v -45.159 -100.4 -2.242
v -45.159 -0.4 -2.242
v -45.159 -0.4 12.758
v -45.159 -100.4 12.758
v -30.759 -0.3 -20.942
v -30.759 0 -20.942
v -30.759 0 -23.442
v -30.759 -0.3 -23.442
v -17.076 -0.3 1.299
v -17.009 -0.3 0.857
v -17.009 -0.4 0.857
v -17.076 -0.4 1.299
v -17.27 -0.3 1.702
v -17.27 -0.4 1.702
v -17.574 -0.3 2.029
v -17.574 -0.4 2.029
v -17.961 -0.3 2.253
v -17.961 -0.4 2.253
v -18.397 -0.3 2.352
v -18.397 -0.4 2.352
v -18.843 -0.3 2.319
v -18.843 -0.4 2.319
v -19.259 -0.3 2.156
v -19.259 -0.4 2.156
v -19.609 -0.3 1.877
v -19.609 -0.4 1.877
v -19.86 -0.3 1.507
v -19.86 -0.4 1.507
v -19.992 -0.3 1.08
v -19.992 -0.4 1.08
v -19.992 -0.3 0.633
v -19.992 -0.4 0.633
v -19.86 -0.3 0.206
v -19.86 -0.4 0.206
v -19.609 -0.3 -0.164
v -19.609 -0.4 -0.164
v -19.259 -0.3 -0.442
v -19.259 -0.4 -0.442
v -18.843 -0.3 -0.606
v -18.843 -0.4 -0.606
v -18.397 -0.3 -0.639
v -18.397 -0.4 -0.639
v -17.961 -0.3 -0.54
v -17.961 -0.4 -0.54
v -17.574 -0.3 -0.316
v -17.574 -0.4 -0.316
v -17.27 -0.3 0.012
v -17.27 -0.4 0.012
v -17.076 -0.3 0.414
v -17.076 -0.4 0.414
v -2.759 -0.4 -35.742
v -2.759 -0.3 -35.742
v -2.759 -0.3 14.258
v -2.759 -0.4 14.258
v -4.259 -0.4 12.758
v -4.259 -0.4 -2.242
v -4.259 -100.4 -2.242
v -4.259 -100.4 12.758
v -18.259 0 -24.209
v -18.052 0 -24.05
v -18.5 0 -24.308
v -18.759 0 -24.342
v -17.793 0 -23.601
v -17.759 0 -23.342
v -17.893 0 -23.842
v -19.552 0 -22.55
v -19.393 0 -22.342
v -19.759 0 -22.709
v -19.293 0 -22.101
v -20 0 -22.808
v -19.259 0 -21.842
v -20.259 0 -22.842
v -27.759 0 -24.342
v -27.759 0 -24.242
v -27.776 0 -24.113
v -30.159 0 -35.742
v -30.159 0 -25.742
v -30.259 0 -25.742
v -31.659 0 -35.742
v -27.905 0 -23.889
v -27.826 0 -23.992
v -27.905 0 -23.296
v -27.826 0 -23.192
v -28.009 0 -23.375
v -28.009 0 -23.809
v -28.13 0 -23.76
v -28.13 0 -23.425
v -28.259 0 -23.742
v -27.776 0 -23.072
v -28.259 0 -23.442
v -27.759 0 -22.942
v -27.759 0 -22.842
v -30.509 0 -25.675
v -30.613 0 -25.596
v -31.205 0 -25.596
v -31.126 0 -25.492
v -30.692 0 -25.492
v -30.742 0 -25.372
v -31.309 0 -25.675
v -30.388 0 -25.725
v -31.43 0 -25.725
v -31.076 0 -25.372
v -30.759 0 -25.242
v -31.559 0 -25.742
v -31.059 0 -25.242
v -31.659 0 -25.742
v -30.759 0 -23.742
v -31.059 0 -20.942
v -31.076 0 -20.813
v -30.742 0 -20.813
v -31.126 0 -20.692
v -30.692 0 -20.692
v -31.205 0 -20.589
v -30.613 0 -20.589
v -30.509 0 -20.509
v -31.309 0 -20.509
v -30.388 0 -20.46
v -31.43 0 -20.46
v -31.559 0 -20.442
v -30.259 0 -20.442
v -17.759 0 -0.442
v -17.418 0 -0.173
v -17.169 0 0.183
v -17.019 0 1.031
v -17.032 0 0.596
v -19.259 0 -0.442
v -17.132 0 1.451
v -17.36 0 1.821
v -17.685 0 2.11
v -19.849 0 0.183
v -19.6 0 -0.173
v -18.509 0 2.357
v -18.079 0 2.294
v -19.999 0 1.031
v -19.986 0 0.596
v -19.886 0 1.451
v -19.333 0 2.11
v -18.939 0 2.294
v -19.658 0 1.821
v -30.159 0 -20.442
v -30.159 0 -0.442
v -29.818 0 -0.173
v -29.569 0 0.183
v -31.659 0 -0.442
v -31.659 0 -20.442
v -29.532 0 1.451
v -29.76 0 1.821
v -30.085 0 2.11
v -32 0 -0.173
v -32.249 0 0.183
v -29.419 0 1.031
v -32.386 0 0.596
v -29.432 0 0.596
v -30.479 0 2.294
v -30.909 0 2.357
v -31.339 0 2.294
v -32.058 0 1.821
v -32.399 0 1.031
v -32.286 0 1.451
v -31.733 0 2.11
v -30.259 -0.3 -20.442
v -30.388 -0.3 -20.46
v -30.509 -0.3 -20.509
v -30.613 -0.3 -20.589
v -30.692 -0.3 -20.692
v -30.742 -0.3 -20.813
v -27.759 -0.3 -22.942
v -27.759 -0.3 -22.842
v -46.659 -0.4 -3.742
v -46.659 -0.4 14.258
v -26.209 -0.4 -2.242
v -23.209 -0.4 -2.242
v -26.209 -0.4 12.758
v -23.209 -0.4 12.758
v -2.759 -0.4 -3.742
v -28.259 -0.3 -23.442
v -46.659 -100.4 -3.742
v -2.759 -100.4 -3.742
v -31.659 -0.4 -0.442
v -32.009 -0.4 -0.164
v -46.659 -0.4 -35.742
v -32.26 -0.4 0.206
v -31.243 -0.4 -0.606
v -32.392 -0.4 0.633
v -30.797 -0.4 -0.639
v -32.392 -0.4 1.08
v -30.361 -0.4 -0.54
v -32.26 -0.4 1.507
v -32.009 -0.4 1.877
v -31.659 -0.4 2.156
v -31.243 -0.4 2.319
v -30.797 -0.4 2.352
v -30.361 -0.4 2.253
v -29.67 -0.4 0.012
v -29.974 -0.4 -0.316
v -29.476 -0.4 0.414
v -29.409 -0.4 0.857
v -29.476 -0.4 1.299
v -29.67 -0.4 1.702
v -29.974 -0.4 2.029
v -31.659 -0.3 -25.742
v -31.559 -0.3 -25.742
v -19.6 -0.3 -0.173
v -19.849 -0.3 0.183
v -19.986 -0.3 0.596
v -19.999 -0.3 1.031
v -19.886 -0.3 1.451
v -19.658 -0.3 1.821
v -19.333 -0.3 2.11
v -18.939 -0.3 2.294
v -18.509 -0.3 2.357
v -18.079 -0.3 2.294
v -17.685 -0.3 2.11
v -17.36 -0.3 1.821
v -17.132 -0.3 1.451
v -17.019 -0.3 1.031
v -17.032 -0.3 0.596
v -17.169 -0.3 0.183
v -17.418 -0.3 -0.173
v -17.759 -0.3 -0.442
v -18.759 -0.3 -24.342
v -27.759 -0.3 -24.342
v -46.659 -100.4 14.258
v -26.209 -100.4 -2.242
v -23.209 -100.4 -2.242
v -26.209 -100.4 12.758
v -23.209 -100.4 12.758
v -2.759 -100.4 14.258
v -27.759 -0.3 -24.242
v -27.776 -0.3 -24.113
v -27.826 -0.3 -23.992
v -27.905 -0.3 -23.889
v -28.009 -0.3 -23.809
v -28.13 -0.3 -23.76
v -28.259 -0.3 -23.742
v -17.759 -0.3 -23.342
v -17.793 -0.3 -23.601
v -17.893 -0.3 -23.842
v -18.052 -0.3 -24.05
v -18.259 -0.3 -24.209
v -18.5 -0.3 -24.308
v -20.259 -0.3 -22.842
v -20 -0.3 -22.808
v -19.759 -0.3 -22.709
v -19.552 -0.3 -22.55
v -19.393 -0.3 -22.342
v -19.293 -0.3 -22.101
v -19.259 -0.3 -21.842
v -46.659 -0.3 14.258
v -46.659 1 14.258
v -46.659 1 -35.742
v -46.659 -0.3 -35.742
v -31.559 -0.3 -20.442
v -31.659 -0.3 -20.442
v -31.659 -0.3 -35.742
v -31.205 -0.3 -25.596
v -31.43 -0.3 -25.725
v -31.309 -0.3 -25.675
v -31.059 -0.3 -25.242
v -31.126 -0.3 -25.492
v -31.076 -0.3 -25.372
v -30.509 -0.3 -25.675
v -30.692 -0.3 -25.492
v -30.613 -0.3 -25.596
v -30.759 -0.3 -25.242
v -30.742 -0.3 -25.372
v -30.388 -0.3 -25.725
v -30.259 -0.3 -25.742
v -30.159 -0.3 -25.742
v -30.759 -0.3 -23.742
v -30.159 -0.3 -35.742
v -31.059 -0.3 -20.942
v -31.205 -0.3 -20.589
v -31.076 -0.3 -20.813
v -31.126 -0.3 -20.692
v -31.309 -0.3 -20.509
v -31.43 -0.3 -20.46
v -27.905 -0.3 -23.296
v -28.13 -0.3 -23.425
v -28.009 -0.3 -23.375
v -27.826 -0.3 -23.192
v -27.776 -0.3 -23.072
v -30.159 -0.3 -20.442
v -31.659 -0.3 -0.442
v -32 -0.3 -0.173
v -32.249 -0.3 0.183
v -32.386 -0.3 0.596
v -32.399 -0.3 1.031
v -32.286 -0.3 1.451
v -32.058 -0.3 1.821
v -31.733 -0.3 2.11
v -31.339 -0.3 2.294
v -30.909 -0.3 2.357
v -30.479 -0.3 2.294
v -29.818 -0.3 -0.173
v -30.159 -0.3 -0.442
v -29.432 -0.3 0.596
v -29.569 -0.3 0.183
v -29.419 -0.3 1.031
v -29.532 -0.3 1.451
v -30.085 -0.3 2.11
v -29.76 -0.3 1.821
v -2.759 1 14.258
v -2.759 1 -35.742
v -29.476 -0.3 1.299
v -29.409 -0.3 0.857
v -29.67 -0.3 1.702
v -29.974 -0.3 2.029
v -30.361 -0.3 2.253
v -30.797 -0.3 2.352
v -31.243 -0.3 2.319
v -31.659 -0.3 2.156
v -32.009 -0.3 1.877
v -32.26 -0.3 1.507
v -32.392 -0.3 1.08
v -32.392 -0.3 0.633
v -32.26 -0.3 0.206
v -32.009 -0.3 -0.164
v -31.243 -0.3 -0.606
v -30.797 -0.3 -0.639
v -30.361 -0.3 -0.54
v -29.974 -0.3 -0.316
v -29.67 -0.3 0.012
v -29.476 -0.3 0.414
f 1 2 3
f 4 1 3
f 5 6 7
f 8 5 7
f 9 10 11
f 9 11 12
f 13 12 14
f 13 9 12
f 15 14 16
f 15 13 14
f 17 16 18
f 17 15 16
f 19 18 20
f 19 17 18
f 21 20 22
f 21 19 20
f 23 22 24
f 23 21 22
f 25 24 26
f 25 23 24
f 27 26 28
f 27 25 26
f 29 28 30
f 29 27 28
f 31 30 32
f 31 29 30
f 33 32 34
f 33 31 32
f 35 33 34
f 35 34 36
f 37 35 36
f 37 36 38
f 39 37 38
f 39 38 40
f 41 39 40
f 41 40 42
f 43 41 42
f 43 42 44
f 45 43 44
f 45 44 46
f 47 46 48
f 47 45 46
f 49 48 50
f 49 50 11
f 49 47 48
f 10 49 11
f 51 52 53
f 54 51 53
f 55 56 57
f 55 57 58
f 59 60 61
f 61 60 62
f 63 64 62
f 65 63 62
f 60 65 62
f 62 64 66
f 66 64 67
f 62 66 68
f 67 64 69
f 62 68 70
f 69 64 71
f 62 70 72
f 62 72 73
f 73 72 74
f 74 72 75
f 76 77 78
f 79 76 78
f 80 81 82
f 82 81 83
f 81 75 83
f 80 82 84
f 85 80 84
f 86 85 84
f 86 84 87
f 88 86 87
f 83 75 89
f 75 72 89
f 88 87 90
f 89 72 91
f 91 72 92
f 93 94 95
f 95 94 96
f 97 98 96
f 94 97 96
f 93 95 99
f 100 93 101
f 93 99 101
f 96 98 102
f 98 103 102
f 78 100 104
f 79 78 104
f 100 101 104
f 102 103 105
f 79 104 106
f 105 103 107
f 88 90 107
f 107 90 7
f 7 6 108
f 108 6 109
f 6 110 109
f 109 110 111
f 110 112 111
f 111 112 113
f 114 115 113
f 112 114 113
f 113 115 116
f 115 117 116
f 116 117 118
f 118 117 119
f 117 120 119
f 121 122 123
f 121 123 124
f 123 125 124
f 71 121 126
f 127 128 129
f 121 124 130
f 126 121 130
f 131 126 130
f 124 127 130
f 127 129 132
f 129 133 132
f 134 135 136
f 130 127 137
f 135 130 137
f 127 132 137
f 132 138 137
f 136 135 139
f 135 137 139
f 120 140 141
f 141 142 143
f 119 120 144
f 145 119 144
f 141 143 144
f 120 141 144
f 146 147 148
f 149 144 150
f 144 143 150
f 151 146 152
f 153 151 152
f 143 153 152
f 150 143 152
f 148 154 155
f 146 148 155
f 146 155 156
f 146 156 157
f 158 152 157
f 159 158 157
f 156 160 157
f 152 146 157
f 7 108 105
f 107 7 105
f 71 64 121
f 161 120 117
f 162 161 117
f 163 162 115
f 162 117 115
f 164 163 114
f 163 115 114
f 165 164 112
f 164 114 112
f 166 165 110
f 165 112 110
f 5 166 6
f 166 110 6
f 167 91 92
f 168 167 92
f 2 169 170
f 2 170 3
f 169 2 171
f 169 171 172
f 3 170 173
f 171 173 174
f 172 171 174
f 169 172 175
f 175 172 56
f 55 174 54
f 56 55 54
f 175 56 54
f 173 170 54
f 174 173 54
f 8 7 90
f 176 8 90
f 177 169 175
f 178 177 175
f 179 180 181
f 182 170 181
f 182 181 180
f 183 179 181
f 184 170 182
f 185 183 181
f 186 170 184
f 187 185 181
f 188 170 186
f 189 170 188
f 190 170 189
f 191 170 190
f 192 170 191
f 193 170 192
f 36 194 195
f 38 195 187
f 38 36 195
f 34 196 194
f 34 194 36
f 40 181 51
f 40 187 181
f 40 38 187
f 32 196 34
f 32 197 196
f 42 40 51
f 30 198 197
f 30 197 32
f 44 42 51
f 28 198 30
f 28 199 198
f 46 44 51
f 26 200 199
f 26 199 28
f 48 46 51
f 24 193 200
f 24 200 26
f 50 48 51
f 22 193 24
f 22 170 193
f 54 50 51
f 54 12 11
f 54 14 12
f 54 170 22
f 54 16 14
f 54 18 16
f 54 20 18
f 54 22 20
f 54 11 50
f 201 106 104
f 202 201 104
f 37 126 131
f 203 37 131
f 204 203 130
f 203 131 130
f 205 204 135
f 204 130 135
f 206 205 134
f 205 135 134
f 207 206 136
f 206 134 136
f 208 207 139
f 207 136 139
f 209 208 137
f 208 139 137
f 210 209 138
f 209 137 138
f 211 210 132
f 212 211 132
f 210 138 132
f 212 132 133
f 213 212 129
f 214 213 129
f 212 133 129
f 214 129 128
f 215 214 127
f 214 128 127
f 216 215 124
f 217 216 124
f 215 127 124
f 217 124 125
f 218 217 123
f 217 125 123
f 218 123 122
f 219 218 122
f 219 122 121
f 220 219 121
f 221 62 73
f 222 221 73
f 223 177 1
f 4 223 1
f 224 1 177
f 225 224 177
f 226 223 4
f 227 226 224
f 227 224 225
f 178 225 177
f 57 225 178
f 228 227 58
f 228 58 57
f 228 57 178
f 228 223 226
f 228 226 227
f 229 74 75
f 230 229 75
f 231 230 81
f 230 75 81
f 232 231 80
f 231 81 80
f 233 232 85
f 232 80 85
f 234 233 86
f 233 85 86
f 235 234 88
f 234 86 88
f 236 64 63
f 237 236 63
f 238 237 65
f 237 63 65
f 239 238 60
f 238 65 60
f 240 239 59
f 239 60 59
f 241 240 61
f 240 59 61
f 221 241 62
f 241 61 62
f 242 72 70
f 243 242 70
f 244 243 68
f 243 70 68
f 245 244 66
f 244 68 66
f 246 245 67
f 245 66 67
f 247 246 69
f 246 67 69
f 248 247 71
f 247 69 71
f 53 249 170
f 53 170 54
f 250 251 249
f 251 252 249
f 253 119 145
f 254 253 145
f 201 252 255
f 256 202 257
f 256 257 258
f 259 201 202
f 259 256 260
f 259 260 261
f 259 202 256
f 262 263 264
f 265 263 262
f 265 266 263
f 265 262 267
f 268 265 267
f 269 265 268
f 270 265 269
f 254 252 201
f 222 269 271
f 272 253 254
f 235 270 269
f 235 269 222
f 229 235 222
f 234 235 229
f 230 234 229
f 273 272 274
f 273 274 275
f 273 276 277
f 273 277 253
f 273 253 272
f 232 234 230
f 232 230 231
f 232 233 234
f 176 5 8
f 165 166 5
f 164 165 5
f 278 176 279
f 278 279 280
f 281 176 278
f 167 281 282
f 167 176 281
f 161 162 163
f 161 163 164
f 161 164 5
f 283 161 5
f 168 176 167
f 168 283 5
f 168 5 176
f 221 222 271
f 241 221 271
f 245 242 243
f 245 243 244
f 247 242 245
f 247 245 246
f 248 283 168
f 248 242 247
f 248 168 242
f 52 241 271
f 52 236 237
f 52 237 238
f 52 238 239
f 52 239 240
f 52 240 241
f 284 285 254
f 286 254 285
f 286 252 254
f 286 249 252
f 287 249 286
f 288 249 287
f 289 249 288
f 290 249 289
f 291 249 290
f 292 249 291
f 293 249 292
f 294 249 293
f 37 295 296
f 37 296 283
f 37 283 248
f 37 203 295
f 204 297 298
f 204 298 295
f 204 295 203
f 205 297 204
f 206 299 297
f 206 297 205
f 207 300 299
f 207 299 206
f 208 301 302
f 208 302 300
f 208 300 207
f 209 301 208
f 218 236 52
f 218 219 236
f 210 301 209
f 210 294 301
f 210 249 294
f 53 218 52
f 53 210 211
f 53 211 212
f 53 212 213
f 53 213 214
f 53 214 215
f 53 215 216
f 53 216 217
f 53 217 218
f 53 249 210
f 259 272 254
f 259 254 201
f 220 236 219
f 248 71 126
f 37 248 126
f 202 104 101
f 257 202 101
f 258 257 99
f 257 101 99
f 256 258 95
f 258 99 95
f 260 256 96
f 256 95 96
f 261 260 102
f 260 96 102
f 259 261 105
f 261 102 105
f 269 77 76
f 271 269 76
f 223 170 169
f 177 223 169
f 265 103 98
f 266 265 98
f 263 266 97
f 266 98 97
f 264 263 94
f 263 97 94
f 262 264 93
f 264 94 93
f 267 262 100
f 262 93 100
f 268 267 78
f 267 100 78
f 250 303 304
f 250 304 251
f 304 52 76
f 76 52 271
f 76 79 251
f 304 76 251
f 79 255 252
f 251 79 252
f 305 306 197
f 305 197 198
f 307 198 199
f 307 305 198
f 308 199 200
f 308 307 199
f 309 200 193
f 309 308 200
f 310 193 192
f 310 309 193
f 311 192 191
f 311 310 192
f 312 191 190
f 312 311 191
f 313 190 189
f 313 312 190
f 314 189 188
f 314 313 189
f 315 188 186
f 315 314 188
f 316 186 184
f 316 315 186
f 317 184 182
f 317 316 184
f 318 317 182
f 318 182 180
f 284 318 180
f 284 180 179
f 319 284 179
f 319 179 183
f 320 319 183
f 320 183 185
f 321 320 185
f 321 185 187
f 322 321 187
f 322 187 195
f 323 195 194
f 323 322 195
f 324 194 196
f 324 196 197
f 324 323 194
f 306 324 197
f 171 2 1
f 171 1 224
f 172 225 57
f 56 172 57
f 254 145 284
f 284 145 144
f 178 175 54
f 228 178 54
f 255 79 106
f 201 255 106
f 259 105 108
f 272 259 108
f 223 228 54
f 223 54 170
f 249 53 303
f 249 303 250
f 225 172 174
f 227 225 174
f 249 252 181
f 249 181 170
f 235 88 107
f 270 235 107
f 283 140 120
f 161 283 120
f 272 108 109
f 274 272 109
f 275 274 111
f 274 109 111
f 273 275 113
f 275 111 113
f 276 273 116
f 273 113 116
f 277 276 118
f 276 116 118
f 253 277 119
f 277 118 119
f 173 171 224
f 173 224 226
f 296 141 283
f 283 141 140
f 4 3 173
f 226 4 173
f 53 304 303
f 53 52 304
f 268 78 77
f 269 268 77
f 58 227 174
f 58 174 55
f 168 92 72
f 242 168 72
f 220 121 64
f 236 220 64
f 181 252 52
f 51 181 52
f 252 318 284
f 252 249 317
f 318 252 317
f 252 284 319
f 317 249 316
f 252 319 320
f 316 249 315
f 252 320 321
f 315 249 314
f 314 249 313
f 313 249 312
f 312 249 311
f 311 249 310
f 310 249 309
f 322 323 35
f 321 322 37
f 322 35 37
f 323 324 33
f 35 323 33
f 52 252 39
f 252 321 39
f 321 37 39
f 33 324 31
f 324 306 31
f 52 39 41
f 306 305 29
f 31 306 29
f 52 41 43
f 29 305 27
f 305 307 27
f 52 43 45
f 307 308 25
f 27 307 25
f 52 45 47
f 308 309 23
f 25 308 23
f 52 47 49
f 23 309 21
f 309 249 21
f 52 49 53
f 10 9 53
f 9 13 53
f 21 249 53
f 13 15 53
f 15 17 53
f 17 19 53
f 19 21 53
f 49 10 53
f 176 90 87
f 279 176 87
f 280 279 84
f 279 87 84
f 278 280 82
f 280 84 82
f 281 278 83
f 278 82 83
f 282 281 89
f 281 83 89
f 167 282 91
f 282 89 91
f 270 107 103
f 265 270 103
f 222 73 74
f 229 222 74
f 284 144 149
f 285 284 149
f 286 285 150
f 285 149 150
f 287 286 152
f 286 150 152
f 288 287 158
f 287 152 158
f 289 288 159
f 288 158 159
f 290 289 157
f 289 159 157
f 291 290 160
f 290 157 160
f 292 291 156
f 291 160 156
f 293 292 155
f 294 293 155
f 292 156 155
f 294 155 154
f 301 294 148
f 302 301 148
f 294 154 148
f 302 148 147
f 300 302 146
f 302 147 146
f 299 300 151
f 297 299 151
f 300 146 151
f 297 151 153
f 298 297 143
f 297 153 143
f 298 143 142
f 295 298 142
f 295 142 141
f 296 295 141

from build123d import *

# Parameters (mm, degrees)
F1_DEPTH = 0.3
F2_W     = 43.9
F2_H     = 50
F3_DEPTH = 1
F4_W     = 43.9
F4_H     = 50
F4_R     = 1.5
F5_DEPTH = 0.1
F6_W     = 18.95
F6_H     = 15
F7_DEPTH = 100


with BuildPart() as f1:
    # F0 (on Front) → F1 (new body)
    with BuildSketch(Plane.XZ):
        with BuildLine():
            Line((-31.05896, -25.242487), (-31.05896, -20.942487))
            ThreePointArc((-31.05896, -20.942487), (-31.205407, -20.588934), (-31.55896, -20.442487))
            Line((-31.55896, -20.442487), (-31.65896, -20.442487))
            Line((-31.65896, -20.442487), (-31.65896, -0.442487))
            ThreePointArc((-31.65896, -0.442487), (-30.90896, 2.356551), (-30.15896, -0.442487))
            Line((-30.15896, -0.442487), (-30.15896, -20.442487))
            Line((-30.15896, -20.442487), (-30.25896, -20.442487))
            ThreePointArc((-30.25896, -20.442487), (-30.612513, -20.588934), (-30.75896, -20.942487))
            Line((-30.75896, -20.942487), (-30.75896, -23.442487))
            Line((-30.75896, -23.442487), (-28.25896, -23.442487))
            ThreePointArc((-28.25896, -23.442487), (-27.905407, -23.296041), (-27.75896, -22.942487))
            Line((-27.75896, -22.942487), (-27.75896, -22.842487))
            Line((-27.75896, -22.842487), (-20.25896, -22.842487))
            ThreePointArc((-20.25896, -22.842487), (-19.551853, -22.549594), (-19.25896, -21.842487))
            Line((-19.25896, -21.842487), (-19.25896, -0.442487))
            ThreePointArc((-19.25896, -0.442487), (-18.50896, 2.356551), (-17.75896, -0.442487))
            Line((-17.75896, -0.442487), (-17.75896, -23.342487))
            ThreePointArc((-17.75896, -23.342487), (-18.051853, -24.049594), (-18.75896, -24.342487))
            Line((-18.75896, -24.342487), (-27.75896, -24.342487))
            Line((-27.75896, -24.342487), (-27.75896, -24.242487))
            ThreePointArc((-27.75896, -24.242487), (-27.905407, -23.888934), (-28.25896, -23.742487))
            Line((-28.25896, -23.742487), (-30.75896, -23.742487))
            Line((-30.75896, -23.742487), (-30.75896, -25.242487))
            ThreePointArc((-30.75896, -25.242487), (-30.612513, -25.596041), (-30.25896, -25.742487))
            Line((-30.25896, -25.742487), (-30.15896, -25.742487))
            Line((-30.15896, -25.742487), (-30.15896, -35.742487))
            Line((-30.15896, -35.742487), (-2.75896, -35.742487))
            Line((-2.75896, -35.742487), (-2.75896, 14.257513))
            Line((-2.75896, 14.257513), (-46.65896, 14.257513))
            Line((-46.65896, 14.257513), (-46.65896, -35.742487))
            Line((-46.65896, -35.742487), (-31.65896, -35.742487))
            Line((-31.65896, -35.742487), (-31.65896, -25.742487))
            Line((-31.65896, -25.742487), (-31.55896, -25.742487))
            ThreePointArc((-31.55896, -25.742487), (-31.205407, -25.596041), (-31.05896, -25.242487))
        make_face()
    extrude(amount=F1_DEPTH)

    # F2 (on face) → F3 (join)
    with BuildSketch(Plane(origin=(0, 0, 0), x_dir=(-1, 0, 0), z_dir=(0, 1, 0))):
        with Locations((24.70896, -10.742487)):
            Rectangle(F2_W, F2_H)
    extrude(amount=F3_DEPTH)


with BuildPart() as f5:
    # F4 (on face) → F5 (new body)
    with BuildSketch(Plane.XZ.offset(0.3)):
        with Locations((-24.70896, -10.742487)):
            Rectangle(F4_W, F4_H)
        with Locations((-30.90896, 0.856551)):
            Circle(F4_R, mode=Mode.SUBTRACT)
        with Locations((-18.50896, 0.856551)):
            Circle(F4_R, mode=Mode.SUBTRACT)
    extrude(amount=F5_DEPTH)


with BuildPart() as f7:
    # F6 (on face) → F7 (new body)
    with BuildSketch(Plane.XZ.offset(0.4)):
        Polygon((-46.65896, -3.742487), (-24.70896, -3.742487), (-2.75896, -3.742487), (-2.75896, 14.257513), (-24.70896, 14.257513), (-46.65896, 14.257513), align=None)
        with Locations((-35.68396, 5.257513)):
            Rectangle(F6_W, F6_H, mode=Mode.SUBTRACT)
        with Locations((-13.73396, 5.257513)):
            Rectangle(F6_W, F6_H, mode=Mode.SUBTRACT)
    extrude(amount=F7_DEPTH)


solid = Compound([f1.part, f5.part, f7.part])
